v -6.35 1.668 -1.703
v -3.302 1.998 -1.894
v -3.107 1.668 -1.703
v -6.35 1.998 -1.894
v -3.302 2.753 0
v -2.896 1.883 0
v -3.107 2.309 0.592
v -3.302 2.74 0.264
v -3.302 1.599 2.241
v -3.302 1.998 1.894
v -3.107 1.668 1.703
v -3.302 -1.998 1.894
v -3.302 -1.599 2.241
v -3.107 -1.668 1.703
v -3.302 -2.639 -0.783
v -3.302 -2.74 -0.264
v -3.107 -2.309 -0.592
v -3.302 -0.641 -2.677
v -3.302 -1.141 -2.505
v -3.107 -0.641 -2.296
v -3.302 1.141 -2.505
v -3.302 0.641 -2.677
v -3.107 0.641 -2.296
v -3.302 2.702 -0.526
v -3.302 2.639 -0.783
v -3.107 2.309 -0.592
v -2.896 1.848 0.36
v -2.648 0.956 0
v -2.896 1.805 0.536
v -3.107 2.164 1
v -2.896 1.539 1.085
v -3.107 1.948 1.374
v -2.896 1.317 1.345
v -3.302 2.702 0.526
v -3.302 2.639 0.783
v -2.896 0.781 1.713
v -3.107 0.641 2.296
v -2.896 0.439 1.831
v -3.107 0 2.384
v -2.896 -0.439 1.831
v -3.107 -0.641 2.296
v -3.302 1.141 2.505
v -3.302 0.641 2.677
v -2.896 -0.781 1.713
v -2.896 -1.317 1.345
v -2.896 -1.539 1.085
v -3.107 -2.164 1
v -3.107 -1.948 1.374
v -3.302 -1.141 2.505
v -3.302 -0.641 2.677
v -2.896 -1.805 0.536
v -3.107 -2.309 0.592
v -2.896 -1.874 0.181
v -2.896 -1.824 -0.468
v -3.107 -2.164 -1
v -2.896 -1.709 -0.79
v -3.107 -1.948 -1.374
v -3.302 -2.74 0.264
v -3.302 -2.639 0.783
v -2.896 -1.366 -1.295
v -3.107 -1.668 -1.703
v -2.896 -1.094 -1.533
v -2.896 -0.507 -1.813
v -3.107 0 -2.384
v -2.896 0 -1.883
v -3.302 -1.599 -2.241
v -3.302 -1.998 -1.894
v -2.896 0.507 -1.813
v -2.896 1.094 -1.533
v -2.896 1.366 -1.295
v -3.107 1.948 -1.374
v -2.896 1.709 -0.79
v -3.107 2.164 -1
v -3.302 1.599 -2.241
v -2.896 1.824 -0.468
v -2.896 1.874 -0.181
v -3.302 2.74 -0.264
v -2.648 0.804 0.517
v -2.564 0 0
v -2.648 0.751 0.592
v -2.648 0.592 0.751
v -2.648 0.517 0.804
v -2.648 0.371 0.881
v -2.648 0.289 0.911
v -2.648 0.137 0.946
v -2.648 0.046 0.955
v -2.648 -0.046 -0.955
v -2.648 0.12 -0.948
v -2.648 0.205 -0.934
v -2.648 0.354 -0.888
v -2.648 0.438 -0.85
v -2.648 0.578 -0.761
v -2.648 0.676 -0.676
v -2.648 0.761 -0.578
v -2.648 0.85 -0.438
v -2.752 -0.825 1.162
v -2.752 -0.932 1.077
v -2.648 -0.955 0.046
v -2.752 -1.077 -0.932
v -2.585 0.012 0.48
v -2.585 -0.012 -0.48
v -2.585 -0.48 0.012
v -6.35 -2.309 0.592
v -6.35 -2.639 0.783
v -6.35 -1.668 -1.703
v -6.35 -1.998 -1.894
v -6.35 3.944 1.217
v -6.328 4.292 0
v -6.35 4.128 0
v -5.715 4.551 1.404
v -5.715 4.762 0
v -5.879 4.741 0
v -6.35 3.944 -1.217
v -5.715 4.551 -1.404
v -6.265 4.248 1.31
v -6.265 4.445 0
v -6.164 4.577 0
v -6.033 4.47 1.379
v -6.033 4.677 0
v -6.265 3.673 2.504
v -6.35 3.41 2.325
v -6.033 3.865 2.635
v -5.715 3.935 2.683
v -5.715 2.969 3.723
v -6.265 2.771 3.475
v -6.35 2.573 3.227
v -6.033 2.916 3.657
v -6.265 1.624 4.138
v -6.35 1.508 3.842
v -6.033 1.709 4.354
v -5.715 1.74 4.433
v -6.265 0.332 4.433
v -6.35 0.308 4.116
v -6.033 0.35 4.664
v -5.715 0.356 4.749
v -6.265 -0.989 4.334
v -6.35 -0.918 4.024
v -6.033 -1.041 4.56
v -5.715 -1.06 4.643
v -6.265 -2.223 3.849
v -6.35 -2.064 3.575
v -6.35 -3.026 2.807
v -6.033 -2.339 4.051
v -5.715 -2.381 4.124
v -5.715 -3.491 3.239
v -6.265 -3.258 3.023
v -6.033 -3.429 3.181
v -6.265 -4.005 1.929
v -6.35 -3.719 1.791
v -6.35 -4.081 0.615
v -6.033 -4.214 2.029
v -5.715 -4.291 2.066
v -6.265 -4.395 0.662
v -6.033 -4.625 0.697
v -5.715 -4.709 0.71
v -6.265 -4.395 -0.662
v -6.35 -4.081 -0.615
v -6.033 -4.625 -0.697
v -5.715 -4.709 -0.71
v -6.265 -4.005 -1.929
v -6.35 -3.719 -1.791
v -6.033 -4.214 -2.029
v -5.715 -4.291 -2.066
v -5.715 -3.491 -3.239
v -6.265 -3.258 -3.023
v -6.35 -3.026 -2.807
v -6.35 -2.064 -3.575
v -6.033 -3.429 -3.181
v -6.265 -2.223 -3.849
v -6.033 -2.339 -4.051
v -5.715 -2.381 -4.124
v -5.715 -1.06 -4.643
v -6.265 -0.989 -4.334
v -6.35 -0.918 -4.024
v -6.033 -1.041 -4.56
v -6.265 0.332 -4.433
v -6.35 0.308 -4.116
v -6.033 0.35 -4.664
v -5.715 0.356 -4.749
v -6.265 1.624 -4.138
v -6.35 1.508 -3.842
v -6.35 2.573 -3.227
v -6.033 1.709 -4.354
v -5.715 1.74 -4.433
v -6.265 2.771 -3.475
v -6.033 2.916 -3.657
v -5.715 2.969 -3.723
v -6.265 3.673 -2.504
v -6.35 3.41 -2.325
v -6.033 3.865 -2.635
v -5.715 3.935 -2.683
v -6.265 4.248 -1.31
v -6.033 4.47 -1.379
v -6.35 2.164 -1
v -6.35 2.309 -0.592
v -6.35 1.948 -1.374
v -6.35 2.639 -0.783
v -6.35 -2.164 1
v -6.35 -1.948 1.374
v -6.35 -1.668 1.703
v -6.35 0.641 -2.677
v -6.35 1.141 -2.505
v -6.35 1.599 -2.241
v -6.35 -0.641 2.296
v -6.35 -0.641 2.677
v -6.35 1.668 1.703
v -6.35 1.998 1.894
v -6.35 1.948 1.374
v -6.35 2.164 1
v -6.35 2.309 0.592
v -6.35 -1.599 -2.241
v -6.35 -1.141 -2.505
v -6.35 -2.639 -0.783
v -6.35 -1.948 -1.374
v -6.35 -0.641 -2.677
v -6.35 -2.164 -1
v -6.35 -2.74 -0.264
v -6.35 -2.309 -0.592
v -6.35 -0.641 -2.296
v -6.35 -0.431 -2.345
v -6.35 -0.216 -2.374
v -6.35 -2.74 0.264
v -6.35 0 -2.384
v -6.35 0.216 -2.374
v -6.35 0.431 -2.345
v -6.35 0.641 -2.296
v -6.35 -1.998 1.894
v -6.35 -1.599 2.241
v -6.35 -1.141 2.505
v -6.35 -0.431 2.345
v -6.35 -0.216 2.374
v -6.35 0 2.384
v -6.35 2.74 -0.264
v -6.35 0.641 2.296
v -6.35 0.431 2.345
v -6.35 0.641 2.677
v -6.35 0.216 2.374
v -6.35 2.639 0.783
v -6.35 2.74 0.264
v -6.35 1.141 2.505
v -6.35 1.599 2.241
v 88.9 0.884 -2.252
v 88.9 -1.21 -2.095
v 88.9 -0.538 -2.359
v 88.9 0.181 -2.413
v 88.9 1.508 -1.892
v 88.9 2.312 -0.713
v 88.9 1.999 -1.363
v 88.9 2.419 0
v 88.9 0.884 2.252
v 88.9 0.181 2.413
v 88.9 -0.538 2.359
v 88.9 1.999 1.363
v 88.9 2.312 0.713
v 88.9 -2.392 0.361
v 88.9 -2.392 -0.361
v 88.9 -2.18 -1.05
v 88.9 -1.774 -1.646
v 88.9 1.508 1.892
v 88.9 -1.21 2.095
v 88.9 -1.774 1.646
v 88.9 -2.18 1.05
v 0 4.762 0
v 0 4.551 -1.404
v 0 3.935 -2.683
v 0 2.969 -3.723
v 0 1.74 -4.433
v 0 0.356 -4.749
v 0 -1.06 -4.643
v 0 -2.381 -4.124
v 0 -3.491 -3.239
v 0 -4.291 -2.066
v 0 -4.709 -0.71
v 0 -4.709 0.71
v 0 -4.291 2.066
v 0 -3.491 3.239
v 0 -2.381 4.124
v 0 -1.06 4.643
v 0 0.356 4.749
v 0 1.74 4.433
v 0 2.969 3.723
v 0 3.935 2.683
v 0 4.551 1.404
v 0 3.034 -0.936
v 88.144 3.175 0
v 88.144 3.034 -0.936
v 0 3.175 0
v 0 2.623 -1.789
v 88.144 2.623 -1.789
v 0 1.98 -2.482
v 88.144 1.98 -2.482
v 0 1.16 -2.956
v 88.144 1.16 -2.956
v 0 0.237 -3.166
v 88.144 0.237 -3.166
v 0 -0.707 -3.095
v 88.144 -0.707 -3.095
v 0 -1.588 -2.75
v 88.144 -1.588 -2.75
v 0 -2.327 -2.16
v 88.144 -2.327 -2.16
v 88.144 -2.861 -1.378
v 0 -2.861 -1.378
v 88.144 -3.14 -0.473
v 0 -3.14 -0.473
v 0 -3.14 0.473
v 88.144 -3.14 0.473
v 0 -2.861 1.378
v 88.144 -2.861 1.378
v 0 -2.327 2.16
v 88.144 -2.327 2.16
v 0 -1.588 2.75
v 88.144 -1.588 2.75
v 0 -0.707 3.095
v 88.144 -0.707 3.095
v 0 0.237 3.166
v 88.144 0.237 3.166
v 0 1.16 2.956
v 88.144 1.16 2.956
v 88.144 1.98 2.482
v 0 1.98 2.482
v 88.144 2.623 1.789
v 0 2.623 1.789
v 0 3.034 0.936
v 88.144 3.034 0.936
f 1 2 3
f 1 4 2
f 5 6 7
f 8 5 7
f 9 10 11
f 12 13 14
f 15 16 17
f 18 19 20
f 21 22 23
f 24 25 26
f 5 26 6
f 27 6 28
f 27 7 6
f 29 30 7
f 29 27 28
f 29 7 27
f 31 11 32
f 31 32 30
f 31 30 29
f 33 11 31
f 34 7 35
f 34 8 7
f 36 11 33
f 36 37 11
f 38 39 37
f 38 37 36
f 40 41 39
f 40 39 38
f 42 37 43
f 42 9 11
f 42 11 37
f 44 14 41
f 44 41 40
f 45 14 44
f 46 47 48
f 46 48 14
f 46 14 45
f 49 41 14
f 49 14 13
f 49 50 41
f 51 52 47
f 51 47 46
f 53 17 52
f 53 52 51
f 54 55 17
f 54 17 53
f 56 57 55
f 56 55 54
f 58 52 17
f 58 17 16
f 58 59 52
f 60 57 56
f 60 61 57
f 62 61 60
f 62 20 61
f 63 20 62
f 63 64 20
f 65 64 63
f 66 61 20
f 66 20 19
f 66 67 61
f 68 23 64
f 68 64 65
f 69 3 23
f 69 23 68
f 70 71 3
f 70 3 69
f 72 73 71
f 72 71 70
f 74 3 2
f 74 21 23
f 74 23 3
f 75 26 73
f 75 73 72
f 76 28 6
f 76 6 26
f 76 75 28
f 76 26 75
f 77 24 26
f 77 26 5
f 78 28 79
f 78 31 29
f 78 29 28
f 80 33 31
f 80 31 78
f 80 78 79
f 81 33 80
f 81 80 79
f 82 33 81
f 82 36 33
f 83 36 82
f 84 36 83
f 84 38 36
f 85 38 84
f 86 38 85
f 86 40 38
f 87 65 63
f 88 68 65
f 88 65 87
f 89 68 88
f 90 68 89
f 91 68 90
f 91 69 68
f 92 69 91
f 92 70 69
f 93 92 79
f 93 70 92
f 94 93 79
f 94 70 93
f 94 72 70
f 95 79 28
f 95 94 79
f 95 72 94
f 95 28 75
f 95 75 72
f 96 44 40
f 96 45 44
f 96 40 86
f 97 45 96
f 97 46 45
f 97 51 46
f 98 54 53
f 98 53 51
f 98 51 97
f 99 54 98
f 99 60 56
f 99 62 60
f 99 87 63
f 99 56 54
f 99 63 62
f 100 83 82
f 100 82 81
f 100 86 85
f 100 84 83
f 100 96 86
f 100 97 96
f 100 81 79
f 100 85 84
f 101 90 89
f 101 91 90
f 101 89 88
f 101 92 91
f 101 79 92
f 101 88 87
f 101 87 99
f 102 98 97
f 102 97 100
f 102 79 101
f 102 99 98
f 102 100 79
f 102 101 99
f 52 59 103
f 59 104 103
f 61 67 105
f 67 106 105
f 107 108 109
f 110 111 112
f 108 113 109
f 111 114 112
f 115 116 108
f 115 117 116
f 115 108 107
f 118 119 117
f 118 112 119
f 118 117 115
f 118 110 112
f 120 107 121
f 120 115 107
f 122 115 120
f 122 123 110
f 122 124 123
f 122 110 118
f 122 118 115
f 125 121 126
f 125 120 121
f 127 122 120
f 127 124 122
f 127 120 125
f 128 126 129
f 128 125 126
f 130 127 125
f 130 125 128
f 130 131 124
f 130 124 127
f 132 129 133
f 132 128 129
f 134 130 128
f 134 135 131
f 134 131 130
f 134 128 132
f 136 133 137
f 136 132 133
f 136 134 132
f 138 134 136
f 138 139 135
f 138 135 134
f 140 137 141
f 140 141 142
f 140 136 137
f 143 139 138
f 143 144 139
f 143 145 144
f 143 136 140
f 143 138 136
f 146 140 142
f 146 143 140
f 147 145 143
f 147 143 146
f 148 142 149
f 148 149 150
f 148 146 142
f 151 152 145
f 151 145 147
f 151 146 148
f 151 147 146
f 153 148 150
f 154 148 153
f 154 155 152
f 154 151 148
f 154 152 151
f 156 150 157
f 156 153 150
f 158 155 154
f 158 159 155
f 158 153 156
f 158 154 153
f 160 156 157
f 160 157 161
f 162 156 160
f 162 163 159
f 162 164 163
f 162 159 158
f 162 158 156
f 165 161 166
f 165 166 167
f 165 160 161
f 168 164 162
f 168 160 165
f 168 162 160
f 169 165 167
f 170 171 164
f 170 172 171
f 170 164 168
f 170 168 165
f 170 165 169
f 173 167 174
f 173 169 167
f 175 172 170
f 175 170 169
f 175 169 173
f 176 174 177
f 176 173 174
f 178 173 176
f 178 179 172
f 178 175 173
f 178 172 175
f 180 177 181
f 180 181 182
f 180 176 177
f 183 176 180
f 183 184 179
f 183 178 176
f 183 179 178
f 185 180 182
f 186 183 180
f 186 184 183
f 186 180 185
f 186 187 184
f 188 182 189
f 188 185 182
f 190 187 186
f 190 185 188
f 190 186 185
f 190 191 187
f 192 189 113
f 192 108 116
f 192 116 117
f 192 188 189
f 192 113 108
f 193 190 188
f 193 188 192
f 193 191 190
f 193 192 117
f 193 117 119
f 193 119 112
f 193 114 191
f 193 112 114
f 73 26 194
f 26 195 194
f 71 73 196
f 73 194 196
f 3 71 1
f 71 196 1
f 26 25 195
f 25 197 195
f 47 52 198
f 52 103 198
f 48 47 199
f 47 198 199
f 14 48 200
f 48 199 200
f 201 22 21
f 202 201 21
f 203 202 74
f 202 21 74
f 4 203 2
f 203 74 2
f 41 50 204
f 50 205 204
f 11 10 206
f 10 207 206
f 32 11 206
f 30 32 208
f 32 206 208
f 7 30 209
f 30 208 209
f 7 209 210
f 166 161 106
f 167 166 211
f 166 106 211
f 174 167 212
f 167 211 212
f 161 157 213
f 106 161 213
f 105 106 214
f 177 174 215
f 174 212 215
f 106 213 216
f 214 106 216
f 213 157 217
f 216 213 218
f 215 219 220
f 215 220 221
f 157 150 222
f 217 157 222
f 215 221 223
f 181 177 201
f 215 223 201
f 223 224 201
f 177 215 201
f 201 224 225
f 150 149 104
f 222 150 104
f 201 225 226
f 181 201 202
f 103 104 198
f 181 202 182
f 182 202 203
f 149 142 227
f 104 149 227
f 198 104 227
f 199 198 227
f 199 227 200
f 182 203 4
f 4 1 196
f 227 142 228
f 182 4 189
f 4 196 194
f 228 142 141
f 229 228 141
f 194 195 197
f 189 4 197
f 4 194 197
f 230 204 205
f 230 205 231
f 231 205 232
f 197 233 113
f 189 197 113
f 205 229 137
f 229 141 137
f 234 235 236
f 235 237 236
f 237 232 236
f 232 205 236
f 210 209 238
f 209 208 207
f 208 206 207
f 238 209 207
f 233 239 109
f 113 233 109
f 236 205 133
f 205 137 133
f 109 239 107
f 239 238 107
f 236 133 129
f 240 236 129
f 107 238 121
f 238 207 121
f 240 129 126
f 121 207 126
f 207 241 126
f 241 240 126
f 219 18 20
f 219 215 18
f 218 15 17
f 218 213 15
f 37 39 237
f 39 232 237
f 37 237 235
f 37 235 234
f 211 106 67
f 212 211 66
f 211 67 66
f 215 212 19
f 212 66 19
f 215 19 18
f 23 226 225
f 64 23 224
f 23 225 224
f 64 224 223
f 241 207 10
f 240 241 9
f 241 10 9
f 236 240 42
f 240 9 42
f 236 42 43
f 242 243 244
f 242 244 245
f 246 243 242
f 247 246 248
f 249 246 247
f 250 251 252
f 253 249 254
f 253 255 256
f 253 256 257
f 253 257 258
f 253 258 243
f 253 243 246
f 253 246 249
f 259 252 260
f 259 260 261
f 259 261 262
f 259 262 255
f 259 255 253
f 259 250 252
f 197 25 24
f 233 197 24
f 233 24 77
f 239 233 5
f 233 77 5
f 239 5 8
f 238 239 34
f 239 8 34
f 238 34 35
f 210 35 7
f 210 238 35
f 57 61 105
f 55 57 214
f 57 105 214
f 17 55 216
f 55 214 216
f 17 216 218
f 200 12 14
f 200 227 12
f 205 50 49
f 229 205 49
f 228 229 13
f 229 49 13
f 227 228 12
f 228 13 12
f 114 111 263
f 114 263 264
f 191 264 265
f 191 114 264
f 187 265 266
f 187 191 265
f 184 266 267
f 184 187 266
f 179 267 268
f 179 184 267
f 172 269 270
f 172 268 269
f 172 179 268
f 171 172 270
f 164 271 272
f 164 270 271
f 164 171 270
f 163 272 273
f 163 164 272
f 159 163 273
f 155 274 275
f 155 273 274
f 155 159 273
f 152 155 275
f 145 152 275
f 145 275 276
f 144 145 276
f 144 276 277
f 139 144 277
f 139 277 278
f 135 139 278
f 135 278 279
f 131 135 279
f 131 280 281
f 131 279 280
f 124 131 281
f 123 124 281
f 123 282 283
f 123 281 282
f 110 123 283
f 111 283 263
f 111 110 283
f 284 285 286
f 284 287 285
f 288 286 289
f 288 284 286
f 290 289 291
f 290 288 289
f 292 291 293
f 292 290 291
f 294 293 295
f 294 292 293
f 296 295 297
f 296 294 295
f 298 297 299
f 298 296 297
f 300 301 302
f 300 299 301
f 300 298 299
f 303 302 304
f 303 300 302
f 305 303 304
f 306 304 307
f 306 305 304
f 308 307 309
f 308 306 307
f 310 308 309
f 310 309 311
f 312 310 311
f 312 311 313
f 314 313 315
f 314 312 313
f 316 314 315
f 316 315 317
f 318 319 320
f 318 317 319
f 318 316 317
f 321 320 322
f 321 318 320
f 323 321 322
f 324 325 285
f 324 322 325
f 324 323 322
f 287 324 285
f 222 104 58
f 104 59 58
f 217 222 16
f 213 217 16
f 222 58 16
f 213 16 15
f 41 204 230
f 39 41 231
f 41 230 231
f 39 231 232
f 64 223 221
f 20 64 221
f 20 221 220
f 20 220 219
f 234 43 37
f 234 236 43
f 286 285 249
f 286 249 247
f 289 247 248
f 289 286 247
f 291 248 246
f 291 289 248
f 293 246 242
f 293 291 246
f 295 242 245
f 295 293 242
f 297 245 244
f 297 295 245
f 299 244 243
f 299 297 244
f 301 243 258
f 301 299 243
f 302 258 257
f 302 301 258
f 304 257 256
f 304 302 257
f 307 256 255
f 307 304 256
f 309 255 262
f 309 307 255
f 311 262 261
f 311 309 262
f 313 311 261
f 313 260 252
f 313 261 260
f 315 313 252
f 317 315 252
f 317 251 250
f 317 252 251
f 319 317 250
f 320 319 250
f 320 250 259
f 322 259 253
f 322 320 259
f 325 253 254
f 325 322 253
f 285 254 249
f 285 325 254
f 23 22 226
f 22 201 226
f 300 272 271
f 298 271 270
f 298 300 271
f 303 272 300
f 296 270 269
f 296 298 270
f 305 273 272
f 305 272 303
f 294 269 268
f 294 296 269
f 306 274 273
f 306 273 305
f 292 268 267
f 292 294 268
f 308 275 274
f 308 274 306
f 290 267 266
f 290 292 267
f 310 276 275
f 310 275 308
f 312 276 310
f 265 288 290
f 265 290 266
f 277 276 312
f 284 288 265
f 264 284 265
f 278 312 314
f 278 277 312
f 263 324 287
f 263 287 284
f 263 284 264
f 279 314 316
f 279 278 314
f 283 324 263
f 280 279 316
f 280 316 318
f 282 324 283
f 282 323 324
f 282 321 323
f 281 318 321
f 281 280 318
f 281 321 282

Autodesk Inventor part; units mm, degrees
ref_plane "YZ Plane" through (0, 0, 0) normal (1, 0, 0) x (0, 1, 0)
sketch "Sketch1" plane through (0, 0, 0) normal (0, 0, 1) x (1, 0, 0)
  line L0 (-6.35, 0) -> (88.9, 0)
  line L1 (88.9, 0) -> (88.9, 3.175)
  line L2 (88.9, 3.175) -> (0, 3.175)
  line L3 (0, 3.175) -> (0, 4.7625)
  line L4 (-27.4635, 0) -> (108.2939, 0) projected
  line L5 (0, -0.9525) -> (0, 5.715) projected
  line L6 (0, 4.7625) -> (-6.35, 4.7625)
  line L7 (-6.35, 0) -> (-6.35, 4.7625)
  arc A0 (-2.5645, 0) -> (-3.302, 2.7526) centre (-8.0696, 0) ccw
  line L8 (-6.35, 2.7526) -> (-3.302, 2.7526)
  line L9 (12.7, 3.175) -> (0, 3.175) construction
  dimension "d0" = 88.9
  dimension "d1" = 6.35
  dimension "d2" = 6.35
  dimension "d5" = 9.525
  dimension "d13" = 5.5051
  dimension "d14" = 5.5051
  dimension "d15" = 3.048
revolve "Body" add sketch "Sketch1" angle 360 about axis through (-6.35, 0, 0) along (1, 0, 0) contours A0 L8 L7 L6 L3 L5 L0 | L5 L2 L1 L0
ref_plane "IDS_WORKPLANE{1}" through (-6.35, 0, 0) normal (1, 0, 0) x (0, 0, -1)
sketch "Sketch2" plane through (-6.35, 0, 0) normal (1, 0, 0) x (0, 0, -1)
  line L0 (0, -6.6675) -> (0, 6.6675) projected
  line L1 (6.6675, 0) -> (-6.6675, 0) projected
  circle A0 centre (0, 0) radius 4.7625 projected
  line L2 (2.6768, 0.6414) -> (2.2959, 0.6414)
  line L3 (0, 0) -> (2.6768, 0.6414) construction
  line L4 (0, 0) -> (4.0727, 3.8613) construction
  line L5 (0, 0) -> (0.783, 2.6389) construction
  line L6 (0, 0) -> (1.3763, 2.3838) construction
  line L7 (0.783, 2.6389) -> (0.5925, 2.309)
  line L8 (1.8938, 1.9975) -> (1.7034, 1.6676)
  line L9 (0, 0) -> (1.8938, 1.9975) construction
  arc A1 (2.3838, 0) -> (2.2959, 0.6414) centre (0, 0) ccw
  arc A2 (1.7034, 1.6676) -> (0.5925, 2.309) centre (0, 0) ccw
  arc A3 (2.7526, 0) -> (2.6768, 0.6414) centre (0, 0) ccw
  arc A4 (1.8938, 1.9975) -> (0.783, 2.6389) centre (0, 0) ccw
  arc A5 (2.6768, 0.6414) -> (1.6232, 2.223) centre (0, 0) ccw construction
  arc A6 (2.2959, 0.6414) -> (1.7034, 1.6676) centre (0, 0) ccw construction
  line L10 (2.6768, -0.6414) -> (2.2959, -0.6414)
  line L11 (0.783, -2.6389) -> (0.5925, -2.309)
  line L12 (1.8938, -1.9975) -> (1.7034, -1.6676)
  arc A7 (2.2959, -0.6414) -> (2.3838, 0) centre (0, 0) ccw
  arc A8 (0.5925, -2.309) -> (1.7034, -1.6676) centre (0, 0) ccw
  arc A9 (2.6768, -0.6414) -> (2.7526, 0) centre (0, 0) ccw
  arc A10 (0.783, -2.6389) -> (1.8938, -1.9975) centre (0, 0) ccw
  line L13 (-2.6768, 0.6414) -> (-2.2959, 0.6414)
  line L14 (-0.783, 2.6389) -> (-0.5925, 2.309)
  line L15 (-1.8938, 1.9975) -> (-1.7034, 1.6676)
  arc A11 (-2.2959, 0.6414) -> (-2.3838, 0) centre (0, 0) ccw
  arc A12 (-0.5925, 2.309) -> (-1.7034, 1.6676) centre (0, 0) ccw
  arc A13 (-2.6768, 0.6414) -> (-2.7526, 0) centre (0, 0) ccw
  arc A14 (-0.783, 2.6389) -> (-1.8938, 1.9975) centre (0, 0) ccw
  line L16 (-0.783, -2.6389) -> (-0.5925, -2.309)
  arc A15 (-1.7034, -1.6676) -> (-0.5925, -2.309) centre (0, 0) ccw
  line L17 (-1.8938, -1.9975) -> (-1.7034, -1.6676)
  arc A16 (-1.8938, -1.9975) -> (-0.783, -2.6389) centre (0, 0) ccw
  arc A17 (-2.3838, 0) -> (-2.2959, -0.6414) centre (0, 0) ccw
  line L18 (-2.6768, -0.6414) -> (-2.2959, -0.6414)
  arc A18 (-2.7526, 0) -> (-2.6768, -0.6414) centre (0, 0) ccw
  point P0 (1.3763, -2.3838)
  point P1 (-1.3763, 2.3838)
  point P2 (-1.3763, -2.3838)
  dimension "d19" = 0.6413
  dimension "d20" = 1.2827
  dimension "d21" = 33.052
  dimension "d22" = 5.5051
  dimension "d23" = 4.7676
extrude "Slot" add sketch "Sketch2" along normal up to next contours A1 L2 A3 L1 | L1 A9 L10 A7 | A17 L18 A18 L1 | L1 A13 L13 A11 | A4 L8 A2 L7 | L11 A8 L12 A10 | L14 A12 L15 A14 | A16 L17 A15 L16
fillet "Fillet1" radius 0.635 1 edges at (-6.35, -4.7625, 0)
thread "Thread" size "1/4-20 UNC" class "2A" standard "ANSI Unified Screw Threads" length 25.4
chamfer "Chamfer1" distance 0.7556 distance2 0.7556 1 edges at (88.9, -3.175, 0) measured on face at (88.9, 1.0276, 0.2533)
ref_plane "Work Plane2" through (-3.175, 0, 0) normal (0, 0, -1) x (1, 0, 0)
equation "\"d19\" = 0.5 * SBR"
equation "\"d20\" = SBR"
equation "\"d22\" = 1.1547 * SW"
equation "\"d23\" = SW"
equation "\"d17\" = INTI"
equation "\"d24\" = RR"
equation "\"d6\" = GEL"
equation "\"d9\" = -0.5 * SPD + 0.5 * NND"
equation "\"d10\" = GUL"
equation "\"d0\" = NLG"
equation "\"d1\" = KOH"
equation "\"d2\" = NND"
equation "\"d5\" = KOD"
equation "\"d13\" = 1.1547 * SW"
equation "\"d14\" = 1.1547 * SW"
equation "\"d15\" = INTI"
equation "\"NND\" = 6.35"
equation "\"NLG\" = 88.9"
equation "\"GEL\" = 25.4"
equation "\"KOD\" = 9.525"
equation "\"KOH\" = 6.35"
equation "\"SPD\" = GD1"
equation "\"GUL\" = 0.75565"
equation "\"SBR\" = 1.2827"
equation "\"INTI\" = 3.048"
equation "\"d11\" = -KOH"
equation "\"SW\" = 4.76758"
equation "\"d16\" = 1.1547 * SW"
equation "\"d18\" = SW"
equation "\"RR\" = 0.635"
equation "\"TOA\" = 30deg"
equation "\"GD1\" = 4.8387"
equation "\"THREADDIA\" = 6.35"
equation "\"BDM\" = NND"
equation "\"GD\" = NND"
equation "\"GAL\" = 3.175"
equation "\"E0\" = 5.55498"
properties part number "ANSI B18.3 - 1/4-20 UNC - 3.5" material "Steel, Mild"
